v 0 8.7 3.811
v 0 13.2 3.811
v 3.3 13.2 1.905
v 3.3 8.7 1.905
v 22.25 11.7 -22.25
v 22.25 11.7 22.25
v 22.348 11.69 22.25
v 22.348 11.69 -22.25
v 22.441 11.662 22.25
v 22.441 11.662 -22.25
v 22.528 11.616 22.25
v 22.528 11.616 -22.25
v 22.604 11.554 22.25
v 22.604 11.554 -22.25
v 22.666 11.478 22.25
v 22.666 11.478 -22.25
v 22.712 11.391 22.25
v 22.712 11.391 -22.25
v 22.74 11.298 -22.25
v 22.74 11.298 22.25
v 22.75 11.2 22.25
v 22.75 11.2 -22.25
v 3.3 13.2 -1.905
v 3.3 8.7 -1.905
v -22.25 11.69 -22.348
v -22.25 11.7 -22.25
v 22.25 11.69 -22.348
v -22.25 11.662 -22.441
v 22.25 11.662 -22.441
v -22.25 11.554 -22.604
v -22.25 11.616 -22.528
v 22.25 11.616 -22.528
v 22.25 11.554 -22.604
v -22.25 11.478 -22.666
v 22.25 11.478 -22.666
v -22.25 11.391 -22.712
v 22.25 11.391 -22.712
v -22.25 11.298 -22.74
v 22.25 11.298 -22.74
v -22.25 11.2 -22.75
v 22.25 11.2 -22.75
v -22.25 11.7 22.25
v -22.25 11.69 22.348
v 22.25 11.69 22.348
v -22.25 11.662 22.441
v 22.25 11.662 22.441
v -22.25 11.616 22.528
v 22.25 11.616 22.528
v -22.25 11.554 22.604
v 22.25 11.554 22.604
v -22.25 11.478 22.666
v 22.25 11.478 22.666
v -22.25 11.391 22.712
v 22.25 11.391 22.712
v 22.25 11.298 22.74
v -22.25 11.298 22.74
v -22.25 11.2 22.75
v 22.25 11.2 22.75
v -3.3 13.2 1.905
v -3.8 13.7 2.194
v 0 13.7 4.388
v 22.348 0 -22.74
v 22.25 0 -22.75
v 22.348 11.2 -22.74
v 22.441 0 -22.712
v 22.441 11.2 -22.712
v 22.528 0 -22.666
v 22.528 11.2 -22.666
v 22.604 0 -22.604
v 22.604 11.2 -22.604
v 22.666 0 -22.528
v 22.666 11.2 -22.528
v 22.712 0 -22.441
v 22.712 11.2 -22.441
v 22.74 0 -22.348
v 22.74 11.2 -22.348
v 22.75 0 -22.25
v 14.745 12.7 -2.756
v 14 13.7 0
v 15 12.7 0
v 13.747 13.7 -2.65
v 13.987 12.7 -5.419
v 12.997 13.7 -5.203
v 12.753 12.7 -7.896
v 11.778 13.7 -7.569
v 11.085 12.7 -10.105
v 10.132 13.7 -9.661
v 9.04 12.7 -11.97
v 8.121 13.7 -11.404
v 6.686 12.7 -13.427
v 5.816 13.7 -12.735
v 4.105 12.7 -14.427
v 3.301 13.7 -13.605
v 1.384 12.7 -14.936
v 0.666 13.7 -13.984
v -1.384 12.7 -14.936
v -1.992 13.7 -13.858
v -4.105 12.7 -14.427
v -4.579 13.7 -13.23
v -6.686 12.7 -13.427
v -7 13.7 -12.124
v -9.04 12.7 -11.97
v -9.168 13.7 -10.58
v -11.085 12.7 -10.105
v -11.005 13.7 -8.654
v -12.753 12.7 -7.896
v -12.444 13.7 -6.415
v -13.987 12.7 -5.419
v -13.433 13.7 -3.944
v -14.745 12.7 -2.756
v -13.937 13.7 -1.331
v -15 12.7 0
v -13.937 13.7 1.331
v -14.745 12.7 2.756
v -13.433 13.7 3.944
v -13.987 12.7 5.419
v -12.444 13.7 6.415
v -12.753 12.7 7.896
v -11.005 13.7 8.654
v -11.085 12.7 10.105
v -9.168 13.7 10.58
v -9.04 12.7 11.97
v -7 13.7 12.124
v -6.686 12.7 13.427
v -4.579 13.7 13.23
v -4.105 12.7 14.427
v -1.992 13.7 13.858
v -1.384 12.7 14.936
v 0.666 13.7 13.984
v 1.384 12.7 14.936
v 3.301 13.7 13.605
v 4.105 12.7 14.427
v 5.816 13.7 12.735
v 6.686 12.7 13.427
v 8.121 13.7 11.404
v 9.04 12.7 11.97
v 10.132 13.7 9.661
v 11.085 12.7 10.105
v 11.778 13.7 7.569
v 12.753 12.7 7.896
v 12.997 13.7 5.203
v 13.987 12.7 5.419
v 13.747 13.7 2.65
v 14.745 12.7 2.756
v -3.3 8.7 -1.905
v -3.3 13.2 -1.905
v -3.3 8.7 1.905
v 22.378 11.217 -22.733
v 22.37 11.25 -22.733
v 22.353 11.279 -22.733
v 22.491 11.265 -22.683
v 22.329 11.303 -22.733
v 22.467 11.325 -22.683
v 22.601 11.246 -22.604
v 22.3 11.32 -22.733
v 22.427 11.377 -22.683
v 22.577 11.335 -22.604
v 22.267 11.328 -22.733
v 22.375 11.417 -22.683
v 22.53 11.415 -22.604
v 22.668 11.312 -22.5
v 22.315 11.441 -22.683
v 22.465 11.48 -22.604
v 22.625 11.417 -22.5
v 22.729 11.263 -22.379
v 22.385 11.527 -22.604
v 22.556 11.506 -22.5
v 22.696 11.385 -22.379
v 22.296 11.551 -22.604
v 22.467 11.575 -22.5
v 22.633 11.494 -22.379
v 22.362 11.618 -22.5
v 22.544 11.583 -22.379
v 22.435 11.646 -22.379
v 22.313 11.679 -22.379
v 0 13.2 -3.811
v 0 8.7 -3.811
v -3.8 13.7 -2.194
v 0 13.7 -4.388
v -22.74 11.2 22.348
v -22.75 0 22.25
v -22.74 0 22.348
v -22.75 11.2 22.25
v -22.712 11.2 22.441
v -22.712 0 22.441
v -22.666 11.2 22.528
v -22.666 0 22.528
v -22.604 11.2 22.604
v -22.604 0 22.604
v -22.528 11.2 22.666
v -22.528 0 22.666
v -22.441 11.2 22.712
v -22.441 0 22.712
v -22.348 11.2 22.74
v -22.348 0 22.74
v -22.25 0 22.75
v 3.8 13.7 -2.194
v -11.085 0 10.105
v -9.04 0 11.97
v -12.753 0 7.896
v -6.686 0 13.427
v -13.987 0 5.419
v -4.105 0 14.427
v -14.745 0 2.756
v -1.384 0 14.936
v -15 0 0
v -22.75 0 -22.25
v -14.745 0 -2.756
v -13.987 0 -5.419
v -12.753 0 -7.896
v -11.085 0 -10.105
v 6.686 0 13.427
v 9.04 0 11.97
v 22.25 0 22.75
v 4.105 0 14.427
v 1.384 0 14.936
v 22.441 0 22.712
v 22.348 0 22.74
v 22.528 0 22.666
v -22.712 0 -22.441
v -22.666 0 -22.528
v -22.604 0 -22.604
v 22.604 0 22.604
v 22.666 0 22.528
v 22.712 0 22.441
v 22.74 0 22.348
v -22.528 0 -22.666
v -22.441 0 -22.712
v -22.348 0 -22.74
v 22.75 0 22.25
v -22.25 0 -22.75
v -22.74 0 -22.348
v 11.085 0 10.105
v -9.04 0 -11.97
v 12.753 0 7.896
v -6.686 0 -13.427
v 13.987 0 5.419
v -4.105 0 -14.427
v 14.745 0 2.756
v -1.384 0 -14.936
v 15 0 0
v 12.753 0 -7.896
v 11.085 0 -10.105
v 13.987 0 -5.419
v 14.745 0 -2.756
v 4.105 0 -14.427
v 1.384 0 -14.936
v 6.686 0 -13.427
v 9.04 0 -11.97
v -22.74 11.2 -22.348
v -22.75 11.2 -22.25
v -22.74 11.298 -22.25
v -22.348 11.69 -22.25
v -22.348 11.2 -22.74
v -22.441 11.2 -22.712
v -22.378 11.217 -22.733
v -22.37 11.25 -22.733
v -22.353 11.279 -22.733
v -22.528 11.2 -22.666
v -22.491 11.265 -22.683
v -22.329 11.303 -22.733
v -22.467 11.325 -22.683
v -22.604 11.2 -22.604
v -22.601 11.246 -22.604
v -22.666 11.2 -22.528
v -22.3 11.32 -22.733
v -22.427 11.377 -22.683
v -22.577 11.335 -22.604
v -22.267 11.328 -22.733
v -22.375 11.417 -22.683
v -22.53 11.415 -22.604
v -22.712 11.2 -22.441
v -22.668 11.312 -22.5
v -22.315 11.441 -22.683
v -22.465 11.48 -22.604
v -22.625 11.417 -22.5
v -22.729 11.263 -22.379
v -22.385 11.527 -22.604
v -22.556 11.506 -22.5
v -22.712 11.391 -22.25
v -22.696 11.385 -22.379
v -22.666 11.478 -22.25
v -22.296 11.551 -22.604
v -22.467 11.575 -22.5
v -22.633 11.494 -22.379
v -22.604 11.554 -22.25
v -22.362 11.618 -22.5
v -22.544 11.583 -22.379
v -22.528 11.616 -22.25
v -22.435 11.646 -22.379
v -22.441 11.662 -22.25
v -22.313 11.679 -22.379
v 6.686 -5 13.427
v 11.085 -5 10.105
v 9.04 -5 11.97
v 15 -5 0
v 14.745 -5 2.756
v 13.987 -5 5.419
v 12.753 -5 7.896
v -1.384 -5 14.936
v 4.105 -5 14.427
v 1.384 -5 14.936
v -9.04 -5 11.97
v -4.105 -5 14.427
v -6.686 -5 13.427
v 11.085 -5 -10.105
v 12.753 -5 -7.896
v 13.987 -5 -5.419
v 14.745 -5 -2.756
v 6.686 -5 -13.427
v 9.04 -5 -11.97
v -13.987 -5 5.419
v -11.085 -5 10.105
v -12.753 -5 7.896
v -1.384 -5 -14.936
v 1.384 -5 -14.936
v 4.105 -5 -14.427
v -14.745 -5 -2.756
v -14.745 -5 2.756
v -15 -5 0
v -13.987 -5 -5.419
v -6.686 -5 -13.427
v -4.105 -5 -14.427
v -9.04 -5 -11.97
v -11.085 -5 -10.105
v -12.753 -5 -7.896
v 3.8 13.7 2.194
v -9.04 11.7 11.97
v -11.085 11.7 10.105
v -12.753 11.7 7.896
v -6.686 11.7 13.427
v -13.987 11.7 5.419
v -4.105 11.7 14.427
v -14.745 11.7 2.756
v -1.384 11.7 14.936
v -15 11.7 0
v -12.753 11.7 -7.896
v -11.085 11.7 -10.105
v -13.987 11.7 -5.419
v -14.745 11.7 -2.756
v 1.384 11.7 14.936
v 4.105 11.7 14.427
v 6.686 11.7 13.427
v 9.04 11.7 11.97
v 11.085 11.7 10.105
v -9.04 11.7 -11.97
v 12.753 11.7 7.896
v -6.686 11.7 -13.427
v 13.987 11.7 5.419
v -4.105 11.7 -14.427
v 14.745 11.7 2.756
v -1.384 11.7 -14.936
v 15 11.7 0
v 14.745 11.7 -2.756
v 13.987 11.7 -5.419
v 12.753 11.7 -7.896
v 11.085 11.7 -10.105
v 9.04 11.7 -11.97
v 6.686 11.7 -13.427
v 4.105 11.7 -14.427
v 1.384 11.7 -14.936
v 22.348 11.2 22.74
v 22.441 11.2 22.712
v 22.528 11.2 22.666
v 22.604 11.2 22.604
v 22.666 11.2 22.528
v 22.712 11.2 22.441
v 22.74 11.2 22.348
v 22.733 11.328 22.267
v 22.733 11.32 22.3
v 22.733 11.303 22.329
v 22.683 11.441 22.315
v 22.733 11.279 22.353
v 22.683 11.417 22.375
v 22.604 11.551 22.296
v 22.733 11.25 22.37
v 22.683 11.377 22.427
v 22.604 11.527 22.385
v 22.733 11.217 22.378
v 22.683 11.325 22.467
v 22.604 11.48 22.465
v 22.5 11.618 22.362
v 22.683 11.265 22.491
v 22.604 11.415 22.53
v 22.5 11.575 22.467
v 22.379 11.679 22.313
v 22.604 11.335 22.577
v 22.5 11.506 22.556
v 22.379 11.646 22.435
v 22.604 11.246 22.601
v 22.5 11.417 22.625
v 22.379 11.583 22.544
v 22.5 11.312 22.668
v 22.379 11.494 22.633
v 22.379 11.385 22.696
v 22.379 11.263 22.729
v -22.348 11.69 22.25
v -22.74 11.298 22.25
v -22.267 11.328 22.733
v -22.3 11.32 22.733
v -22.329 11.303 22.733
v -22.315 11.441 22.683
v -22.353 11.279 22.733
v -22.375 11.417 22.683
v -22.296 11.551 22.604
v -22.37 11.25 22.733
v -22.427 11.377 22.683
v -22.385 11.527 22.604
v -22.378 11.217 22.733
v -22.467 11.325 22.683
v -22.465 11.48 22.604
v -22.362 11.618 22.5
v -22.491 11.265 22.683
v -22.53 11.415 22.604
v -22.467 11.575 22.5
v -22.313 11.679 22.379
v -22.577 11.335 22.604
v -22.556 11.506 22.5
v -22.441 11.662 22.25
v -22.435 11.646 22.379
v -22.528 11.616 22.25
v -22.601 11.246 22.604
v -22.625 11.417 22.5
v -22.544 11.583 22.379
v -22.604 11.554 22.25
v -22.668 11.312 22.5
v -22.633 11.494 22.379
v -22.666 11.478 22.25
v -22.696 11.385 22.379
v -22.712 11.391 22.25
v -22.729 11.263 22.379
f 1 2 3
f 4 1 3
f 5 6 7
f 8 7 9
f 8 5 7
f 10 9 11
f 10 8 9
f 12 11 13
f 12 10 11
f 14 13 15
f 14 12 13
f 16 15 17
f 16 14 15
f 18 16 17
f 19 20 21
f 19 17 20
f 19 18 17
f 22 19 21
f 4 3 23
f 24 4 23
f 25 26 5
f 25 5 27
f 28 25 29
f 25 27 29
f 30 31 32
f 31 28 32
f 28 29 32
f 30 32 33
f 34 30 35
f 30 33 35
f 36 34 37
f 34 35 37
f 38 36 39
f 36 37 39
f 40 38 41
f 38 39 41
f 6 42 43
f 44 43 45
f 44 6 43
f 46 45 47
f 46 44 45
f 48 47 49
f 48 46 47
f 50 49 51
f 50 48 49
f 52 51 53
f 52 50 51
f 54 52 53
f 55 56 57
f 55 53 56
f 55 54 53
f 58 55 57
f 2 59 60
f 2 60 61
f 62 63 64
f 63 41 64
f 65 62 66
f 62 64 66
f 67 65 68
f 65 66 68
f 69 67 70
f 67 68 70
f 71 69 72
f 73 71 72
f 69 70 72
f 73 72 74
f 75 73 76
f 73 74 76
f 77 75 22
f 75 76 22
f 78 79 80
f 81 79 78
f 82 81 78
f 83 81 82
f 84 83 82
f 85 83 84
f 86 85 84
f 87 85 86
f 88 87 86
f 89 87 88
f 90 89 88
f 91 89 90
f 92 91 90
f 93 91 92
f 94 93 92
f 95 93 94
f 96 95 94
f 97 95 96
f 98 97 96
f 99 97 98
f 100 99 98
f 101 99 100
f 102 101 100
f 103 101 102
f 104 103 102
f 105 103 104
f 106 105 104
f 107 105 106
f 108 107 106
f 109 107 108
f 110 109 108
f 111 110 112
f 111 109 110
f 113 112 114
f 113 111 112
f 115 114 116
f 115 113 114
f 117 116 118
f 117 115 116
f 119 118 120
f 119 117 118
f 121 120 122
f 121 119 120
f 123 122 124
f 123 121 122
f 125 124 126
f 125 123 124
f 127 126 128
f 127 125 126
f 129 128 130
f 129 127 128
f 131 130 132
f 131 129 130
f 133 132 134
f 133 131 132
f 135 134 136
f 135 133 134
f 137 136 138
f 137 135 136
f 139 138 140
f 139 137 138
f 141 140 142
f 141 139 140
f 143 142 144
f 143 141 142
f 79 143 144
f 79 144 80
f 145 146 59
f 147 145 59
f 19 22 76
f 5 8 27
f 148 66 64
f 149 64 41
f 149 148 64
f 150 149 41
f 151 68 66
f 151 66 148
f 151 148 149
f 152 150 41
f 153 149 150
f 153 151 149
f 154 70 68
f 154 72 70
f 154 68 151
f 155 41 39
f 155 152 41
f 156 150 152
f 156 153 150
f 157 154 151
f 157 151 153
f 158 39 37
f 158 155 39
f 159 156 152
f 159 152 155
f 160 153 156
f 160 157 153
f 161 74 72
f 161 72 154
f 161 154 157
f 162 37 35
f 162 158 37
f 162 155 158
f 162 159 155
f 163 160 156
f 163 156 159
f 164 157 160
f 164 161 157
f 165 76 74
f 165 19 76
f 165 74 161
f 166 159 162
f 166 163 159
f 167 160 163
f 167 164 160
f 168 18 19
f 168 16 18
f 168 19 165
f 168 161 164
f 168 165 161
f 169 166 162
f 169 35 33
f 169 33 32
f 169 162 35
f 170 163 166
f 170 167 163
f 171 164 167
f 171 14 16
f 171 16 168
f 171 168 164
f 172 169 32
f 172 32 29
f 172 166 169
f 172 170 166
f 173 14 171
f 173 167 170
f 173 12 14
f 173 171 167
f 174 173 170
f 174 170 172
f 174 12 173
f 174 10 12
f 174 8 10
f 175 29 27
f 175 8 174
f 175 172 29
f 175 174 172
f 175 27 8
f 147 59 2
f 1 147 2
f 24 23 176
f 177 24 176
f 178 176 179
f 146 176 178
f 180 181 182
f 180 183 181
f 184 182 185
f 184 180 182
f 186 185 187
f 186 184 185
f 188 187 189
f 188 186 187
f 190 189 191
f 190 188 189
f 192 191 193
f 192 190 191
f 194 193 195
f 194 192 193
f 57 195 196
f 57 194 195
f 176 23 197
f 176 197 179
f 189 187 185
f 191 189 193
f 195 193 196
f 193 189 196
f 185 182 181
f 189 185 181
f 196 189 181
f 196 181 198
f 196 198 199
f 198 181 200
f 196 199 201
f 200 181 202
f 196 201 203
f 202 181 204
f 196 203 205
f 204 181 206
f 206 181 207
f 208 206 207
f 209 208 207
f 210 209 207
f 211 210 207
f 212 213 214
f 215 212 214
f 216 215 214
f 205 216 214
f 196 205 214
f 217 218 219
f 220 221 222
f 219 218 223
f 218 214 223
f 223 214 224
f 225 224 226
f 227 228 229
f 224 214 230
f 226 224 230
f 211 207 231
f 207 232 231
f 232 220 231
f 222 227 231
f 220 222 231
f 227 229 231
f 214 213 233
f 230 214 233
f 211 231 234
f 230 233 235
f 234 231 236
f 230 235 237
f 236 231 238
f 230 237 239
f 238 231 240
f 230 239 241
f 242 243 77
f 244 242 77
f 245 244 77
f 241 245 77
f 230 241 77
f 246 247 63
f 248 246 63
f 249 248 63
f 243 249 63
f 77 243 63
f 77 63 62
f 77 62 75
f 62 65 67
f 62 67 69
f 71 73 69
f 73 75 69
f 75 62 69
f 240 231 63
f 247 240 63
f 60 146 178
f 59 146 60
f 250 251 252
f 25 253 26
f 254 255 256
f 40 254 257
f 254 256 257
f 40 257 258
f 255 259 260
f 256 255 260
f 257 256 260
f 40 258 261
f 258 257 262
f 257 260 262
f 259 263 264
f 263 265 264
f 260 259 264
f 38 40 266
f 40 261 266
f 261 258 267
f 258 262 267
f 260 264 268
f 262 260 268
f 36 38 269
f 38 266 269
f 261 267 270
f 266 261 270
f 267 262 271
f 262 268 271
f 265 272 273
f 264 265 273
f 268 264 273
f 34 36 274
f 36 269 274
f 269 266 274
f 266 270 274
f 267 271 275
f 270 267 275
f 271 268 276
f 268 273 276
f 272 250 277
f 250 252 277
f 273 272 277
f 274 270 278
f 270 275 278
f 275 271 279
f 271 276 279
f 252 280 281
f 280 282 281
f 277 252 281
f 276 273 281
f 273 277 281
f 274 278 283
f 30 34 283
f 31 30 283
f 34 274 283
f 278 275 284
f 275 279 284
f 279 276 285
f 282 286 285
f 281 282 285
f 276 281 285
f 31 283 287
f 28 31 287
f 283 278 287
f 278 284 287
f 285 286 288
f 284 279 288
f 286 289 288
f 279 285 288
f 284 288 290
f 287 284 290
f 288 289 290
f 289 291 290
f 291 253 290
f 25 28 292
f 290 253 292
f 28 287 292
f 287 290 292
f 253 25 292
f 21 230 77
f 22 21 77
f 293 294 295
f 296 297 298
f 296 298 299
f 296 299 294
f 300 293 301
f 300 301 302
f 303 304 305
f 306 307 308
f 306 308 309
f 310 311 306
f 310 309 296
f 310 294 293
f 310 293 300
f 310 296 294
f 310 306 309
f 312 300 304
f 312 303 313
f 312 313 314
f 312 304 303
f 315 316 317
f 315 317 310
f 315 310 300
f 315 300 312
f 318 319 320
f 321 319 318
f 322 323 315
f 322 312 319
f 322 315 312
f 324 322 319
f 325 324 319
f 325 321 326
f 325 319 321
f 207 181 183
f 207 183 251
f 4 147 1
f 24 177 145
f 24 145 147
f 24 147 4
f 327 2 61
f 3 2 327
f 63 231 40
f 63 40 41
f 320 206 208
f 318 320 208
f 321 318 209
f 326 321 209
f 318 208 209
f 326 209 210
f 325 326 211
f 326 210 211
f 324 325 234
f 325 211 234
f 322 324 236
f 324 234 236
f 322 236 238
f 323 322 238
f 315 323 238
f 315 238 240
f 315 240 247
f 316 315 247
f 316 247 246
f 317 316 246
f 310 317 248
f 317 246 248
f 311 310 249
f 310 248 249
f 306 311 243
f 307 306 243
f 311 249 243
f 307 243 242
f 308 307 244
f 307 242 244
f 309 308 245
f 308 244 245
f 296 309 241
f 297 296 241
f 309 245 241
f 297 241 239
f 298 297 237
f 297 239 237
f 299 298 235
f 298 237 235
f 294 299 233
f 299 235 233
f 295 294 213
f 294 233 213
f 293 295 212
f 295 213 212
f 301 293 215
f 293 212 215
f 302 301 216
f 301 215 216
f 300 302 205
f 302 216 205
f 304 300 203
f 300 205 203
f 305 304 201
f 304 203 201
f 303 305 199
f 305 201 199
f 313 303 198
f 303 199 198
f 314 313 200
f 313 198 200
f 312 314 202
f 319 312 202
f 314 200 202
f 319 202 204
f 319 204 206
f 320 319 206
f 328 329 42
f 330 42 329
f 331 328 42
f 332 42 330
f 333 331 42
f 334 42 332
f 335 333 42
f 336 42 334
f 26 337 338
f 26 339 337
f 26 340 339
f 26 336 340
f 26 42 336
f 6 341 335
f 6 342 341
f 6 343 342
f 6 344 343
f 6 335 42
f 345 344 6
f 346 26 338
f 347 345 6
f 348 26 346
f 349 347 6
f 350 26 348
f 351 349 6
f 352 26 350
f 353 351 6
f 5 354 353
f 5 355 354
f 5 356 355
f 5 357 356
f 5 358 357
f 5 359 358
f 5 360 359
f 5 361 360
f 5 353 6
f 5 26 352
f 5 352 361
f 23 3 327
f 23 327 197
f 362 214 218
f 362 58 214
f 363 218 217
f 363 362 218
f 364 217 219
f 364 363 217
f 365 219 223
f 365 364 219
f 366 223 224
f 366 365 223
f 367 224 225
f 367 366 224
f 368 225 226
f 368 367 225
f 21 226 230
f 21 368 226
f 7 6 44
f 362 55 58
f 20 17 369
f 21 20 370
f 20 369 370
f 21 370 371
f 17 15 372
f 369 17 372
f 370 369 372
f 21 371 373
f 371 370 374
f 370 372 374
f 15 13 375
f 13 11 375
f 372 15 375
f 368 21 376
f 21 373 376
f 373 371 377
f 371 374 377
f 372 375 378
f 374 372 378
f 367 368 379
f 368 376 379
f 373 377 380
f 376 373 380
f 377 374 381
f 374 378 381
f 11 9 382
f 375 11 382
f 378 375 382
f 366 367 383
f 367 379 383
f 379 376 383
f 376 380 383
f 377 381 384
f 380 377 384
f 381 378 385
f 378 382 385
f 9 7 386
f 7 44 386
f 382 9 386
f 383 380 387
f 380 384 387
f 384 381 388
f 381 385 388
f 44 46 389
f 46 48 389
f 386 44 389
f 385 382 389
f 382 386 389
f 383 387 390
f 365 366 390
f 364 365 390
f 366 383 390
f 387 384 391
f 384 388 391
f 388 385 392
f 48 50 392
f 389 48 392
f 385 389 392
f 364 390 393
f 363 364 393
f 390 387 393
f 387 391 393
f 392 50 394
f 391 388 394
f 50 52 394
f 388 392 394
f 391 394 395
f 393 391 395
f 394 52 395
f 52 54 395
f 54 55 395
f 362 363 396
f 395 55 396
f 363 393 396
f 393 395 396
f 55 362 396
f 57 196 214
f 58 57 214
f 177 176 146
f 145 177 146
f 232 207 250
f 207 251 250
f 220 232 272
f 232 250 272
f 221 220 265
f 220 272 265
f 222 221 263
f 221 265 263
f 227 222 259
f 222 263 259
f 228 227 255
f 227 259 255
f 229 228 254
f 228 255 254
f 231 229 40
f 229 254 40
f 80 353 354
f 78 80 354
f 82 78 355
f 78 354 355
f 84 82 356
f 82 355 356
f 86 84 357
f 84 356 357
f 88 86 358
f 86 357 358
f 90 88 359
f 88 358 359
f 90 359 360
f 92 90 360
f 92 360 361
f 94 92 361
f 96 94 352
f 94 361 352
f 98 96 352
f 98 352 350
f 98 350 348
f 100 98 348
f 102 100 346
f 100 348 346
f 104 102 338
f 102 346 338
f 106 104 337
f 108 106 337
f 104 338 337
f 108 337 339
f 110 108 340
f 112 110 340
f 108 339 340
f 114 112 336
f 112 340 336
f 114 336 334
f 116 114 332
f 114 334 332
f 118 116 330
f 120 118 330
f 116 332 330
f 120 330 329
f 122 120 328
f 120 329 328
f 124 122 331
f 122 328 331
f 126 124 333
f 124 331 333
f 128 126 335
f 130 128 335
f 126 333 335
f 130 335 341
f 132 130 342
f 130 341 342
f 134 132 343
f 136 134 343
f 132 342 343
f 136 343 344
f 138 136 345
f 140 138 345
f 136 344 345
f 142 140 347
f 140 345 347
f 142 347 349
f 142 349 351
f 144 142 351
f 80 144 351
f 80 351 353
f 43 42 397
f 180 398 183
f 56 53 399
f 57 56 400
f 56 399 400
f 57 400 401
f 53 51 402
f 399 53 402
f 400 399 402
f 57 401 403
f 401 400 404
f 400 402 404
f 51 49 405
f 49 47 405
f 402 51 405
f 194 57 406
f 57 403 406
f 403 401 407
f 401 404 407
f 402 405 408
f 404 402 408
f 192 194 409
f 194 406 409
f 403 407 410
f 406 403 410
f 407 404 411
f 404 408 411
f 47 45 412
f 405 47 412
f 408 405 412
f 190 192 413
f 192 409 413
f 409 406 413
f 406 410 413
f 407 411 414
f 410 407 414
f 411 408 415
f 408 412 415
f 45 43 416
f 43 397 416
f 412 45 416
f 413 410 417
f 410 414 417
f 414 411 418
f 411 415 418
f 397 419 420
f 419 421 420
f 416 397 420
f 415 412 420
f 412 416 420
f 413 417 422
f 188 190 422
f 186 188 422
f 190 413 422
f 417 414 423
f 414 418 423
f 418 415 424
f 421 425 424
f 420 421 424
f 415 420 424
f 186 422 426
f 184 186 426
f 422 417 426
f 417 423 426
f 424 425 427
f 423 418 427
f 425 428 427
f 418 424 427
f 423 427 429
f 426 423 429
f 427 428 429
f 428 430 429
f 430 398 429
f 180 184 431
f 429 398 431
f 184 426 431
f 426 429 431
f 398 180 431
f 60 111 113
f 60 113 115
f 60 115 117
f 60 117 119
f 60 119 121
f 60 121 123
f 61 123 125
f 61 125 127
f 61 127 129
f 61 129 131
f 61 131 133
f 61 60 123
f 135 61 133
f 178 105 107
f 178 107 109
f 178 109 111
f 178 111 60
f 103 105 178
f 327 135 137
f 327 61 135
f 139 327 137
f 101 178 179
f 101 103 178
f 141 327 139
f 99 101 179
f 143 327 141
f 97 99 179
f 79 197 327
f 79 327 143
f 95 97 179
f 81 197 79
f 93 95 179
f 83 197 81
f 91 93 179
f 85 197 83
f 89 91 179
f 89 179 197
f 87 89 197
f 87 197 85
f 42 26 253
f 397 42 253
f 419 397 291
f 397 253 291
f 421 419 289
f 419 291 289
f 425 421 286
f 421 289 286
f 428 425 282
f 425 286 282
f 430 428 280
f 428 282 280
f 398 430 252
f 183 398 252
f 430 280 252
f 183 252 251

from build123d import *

# Parameters (mm, degrees)
SKETCH1_W           = 45.5
SKETCH1_H           = 45.5
BOSS_EXTRUDE1_DEPTH = 11.7
SKETCH2_R           = 15
BOSS_EXTRUDE2_DEPTH = 2
CHAMFER1_SIZE       = 1
CUT_EXTRUDE1_DEPTH  = 5
CHAMFER2_SIZE       = 0.5
FILLET1_R           = 0.5
SKETCH4_R           = 15
BOSS_EXTRUDE3_DEPTH = 5


with BuildPart() as part:
    # Sketch1 → Boss-Extrude1 (new body)
    with BuildSketch(Plane(origin=(0, 0, 0), x_dir=(1, 0, 0), z_dir=(0, 1, 0))):
        Rectangle(SKETCH1_W, SKETCH1_H)
    extrude(amount=BOSS_EXTRUDE1_DEPTH)

    # Sketch2 → Boss-Extrude2 (add)
    with BuildSketch(Plane(origin=(0, 11.7, 0), x_dir=(1, 0, 0), z_dir=(0, 1, 0))):
        Circle(SKETCH2_R)
    extrude(amount=BOSS_EXTRUDE2_DEPTH)

    # Chamfer1
    chamfer1_edges = [part.edges().sort_by_distance(p)[0] for p in [
        (-15, 13.7, 0),
    ]]
    chamfer(chamfer1_edges, length=CHAMFER1_SIZE)

    # Sketch3 → Cut-Extrude1 (cut)
    with BuildSketch(Plane(origin=(0, 13.7, 0), x_dir=(1, 0, 0), z_dir=(0, 1, 0))):
        Polygon((0, 3.810511777), (-3.3, 1.905255888), (-3.3, -1.905255888), (0, -3.810511777), (3.3, -1.905255888), (3.3, 1.905255888), align=None)
    extrude(amount=-CUT_EXTRUDE1_DEPTH, mode=Mode.SUBTRACT)

    # Chamfer2
    chamfer2_edges = [part.edges().sort_by_distance(p)[0] for p in [
        (1.65, 13.7, -2.857883832),
        (-1.65, 13.7, -2.857883832),
        (-3.3, 13.7, 0),
        (-1.65, 13.7, 2.857883832),
        (1.65, 13.7, 2.857883832),
        (3.3, 13.7, 0),
    ]]
    chamfer(chamfer2_edges, length=CHAMFER2_SIZE)

    # Fillet1
    fillet1_edges = [part.edges().sort_by_distance(p)[0] for p in [
        (-22.75, 11.7, 0),
        (0, 11.7, 22.75),
        (22.75, 11.7, 0),
        (22.75, 5.85, 22.75),
        (-22.75, 5.85, 22.75),
        (-22.75, 5.85, -22.75),
        (22.75, 5.85, -22.75),
        (0, 11.7, -22.75),
    ]]
    fillet(fillet1_edges, radius=FILLET1_R)

    # Sketch4 → Boss-Extrude3 (add)
    with BuildSketch(Plane(origin=(0, 0, 0), x_dir=(-1, 0, 0), z_dir=(0, -1, 0))):
        Circle(SKETCH4_R)
    extrude(amount=BOSS_EXTRUDE3_DEPTH)


solid = part.part
